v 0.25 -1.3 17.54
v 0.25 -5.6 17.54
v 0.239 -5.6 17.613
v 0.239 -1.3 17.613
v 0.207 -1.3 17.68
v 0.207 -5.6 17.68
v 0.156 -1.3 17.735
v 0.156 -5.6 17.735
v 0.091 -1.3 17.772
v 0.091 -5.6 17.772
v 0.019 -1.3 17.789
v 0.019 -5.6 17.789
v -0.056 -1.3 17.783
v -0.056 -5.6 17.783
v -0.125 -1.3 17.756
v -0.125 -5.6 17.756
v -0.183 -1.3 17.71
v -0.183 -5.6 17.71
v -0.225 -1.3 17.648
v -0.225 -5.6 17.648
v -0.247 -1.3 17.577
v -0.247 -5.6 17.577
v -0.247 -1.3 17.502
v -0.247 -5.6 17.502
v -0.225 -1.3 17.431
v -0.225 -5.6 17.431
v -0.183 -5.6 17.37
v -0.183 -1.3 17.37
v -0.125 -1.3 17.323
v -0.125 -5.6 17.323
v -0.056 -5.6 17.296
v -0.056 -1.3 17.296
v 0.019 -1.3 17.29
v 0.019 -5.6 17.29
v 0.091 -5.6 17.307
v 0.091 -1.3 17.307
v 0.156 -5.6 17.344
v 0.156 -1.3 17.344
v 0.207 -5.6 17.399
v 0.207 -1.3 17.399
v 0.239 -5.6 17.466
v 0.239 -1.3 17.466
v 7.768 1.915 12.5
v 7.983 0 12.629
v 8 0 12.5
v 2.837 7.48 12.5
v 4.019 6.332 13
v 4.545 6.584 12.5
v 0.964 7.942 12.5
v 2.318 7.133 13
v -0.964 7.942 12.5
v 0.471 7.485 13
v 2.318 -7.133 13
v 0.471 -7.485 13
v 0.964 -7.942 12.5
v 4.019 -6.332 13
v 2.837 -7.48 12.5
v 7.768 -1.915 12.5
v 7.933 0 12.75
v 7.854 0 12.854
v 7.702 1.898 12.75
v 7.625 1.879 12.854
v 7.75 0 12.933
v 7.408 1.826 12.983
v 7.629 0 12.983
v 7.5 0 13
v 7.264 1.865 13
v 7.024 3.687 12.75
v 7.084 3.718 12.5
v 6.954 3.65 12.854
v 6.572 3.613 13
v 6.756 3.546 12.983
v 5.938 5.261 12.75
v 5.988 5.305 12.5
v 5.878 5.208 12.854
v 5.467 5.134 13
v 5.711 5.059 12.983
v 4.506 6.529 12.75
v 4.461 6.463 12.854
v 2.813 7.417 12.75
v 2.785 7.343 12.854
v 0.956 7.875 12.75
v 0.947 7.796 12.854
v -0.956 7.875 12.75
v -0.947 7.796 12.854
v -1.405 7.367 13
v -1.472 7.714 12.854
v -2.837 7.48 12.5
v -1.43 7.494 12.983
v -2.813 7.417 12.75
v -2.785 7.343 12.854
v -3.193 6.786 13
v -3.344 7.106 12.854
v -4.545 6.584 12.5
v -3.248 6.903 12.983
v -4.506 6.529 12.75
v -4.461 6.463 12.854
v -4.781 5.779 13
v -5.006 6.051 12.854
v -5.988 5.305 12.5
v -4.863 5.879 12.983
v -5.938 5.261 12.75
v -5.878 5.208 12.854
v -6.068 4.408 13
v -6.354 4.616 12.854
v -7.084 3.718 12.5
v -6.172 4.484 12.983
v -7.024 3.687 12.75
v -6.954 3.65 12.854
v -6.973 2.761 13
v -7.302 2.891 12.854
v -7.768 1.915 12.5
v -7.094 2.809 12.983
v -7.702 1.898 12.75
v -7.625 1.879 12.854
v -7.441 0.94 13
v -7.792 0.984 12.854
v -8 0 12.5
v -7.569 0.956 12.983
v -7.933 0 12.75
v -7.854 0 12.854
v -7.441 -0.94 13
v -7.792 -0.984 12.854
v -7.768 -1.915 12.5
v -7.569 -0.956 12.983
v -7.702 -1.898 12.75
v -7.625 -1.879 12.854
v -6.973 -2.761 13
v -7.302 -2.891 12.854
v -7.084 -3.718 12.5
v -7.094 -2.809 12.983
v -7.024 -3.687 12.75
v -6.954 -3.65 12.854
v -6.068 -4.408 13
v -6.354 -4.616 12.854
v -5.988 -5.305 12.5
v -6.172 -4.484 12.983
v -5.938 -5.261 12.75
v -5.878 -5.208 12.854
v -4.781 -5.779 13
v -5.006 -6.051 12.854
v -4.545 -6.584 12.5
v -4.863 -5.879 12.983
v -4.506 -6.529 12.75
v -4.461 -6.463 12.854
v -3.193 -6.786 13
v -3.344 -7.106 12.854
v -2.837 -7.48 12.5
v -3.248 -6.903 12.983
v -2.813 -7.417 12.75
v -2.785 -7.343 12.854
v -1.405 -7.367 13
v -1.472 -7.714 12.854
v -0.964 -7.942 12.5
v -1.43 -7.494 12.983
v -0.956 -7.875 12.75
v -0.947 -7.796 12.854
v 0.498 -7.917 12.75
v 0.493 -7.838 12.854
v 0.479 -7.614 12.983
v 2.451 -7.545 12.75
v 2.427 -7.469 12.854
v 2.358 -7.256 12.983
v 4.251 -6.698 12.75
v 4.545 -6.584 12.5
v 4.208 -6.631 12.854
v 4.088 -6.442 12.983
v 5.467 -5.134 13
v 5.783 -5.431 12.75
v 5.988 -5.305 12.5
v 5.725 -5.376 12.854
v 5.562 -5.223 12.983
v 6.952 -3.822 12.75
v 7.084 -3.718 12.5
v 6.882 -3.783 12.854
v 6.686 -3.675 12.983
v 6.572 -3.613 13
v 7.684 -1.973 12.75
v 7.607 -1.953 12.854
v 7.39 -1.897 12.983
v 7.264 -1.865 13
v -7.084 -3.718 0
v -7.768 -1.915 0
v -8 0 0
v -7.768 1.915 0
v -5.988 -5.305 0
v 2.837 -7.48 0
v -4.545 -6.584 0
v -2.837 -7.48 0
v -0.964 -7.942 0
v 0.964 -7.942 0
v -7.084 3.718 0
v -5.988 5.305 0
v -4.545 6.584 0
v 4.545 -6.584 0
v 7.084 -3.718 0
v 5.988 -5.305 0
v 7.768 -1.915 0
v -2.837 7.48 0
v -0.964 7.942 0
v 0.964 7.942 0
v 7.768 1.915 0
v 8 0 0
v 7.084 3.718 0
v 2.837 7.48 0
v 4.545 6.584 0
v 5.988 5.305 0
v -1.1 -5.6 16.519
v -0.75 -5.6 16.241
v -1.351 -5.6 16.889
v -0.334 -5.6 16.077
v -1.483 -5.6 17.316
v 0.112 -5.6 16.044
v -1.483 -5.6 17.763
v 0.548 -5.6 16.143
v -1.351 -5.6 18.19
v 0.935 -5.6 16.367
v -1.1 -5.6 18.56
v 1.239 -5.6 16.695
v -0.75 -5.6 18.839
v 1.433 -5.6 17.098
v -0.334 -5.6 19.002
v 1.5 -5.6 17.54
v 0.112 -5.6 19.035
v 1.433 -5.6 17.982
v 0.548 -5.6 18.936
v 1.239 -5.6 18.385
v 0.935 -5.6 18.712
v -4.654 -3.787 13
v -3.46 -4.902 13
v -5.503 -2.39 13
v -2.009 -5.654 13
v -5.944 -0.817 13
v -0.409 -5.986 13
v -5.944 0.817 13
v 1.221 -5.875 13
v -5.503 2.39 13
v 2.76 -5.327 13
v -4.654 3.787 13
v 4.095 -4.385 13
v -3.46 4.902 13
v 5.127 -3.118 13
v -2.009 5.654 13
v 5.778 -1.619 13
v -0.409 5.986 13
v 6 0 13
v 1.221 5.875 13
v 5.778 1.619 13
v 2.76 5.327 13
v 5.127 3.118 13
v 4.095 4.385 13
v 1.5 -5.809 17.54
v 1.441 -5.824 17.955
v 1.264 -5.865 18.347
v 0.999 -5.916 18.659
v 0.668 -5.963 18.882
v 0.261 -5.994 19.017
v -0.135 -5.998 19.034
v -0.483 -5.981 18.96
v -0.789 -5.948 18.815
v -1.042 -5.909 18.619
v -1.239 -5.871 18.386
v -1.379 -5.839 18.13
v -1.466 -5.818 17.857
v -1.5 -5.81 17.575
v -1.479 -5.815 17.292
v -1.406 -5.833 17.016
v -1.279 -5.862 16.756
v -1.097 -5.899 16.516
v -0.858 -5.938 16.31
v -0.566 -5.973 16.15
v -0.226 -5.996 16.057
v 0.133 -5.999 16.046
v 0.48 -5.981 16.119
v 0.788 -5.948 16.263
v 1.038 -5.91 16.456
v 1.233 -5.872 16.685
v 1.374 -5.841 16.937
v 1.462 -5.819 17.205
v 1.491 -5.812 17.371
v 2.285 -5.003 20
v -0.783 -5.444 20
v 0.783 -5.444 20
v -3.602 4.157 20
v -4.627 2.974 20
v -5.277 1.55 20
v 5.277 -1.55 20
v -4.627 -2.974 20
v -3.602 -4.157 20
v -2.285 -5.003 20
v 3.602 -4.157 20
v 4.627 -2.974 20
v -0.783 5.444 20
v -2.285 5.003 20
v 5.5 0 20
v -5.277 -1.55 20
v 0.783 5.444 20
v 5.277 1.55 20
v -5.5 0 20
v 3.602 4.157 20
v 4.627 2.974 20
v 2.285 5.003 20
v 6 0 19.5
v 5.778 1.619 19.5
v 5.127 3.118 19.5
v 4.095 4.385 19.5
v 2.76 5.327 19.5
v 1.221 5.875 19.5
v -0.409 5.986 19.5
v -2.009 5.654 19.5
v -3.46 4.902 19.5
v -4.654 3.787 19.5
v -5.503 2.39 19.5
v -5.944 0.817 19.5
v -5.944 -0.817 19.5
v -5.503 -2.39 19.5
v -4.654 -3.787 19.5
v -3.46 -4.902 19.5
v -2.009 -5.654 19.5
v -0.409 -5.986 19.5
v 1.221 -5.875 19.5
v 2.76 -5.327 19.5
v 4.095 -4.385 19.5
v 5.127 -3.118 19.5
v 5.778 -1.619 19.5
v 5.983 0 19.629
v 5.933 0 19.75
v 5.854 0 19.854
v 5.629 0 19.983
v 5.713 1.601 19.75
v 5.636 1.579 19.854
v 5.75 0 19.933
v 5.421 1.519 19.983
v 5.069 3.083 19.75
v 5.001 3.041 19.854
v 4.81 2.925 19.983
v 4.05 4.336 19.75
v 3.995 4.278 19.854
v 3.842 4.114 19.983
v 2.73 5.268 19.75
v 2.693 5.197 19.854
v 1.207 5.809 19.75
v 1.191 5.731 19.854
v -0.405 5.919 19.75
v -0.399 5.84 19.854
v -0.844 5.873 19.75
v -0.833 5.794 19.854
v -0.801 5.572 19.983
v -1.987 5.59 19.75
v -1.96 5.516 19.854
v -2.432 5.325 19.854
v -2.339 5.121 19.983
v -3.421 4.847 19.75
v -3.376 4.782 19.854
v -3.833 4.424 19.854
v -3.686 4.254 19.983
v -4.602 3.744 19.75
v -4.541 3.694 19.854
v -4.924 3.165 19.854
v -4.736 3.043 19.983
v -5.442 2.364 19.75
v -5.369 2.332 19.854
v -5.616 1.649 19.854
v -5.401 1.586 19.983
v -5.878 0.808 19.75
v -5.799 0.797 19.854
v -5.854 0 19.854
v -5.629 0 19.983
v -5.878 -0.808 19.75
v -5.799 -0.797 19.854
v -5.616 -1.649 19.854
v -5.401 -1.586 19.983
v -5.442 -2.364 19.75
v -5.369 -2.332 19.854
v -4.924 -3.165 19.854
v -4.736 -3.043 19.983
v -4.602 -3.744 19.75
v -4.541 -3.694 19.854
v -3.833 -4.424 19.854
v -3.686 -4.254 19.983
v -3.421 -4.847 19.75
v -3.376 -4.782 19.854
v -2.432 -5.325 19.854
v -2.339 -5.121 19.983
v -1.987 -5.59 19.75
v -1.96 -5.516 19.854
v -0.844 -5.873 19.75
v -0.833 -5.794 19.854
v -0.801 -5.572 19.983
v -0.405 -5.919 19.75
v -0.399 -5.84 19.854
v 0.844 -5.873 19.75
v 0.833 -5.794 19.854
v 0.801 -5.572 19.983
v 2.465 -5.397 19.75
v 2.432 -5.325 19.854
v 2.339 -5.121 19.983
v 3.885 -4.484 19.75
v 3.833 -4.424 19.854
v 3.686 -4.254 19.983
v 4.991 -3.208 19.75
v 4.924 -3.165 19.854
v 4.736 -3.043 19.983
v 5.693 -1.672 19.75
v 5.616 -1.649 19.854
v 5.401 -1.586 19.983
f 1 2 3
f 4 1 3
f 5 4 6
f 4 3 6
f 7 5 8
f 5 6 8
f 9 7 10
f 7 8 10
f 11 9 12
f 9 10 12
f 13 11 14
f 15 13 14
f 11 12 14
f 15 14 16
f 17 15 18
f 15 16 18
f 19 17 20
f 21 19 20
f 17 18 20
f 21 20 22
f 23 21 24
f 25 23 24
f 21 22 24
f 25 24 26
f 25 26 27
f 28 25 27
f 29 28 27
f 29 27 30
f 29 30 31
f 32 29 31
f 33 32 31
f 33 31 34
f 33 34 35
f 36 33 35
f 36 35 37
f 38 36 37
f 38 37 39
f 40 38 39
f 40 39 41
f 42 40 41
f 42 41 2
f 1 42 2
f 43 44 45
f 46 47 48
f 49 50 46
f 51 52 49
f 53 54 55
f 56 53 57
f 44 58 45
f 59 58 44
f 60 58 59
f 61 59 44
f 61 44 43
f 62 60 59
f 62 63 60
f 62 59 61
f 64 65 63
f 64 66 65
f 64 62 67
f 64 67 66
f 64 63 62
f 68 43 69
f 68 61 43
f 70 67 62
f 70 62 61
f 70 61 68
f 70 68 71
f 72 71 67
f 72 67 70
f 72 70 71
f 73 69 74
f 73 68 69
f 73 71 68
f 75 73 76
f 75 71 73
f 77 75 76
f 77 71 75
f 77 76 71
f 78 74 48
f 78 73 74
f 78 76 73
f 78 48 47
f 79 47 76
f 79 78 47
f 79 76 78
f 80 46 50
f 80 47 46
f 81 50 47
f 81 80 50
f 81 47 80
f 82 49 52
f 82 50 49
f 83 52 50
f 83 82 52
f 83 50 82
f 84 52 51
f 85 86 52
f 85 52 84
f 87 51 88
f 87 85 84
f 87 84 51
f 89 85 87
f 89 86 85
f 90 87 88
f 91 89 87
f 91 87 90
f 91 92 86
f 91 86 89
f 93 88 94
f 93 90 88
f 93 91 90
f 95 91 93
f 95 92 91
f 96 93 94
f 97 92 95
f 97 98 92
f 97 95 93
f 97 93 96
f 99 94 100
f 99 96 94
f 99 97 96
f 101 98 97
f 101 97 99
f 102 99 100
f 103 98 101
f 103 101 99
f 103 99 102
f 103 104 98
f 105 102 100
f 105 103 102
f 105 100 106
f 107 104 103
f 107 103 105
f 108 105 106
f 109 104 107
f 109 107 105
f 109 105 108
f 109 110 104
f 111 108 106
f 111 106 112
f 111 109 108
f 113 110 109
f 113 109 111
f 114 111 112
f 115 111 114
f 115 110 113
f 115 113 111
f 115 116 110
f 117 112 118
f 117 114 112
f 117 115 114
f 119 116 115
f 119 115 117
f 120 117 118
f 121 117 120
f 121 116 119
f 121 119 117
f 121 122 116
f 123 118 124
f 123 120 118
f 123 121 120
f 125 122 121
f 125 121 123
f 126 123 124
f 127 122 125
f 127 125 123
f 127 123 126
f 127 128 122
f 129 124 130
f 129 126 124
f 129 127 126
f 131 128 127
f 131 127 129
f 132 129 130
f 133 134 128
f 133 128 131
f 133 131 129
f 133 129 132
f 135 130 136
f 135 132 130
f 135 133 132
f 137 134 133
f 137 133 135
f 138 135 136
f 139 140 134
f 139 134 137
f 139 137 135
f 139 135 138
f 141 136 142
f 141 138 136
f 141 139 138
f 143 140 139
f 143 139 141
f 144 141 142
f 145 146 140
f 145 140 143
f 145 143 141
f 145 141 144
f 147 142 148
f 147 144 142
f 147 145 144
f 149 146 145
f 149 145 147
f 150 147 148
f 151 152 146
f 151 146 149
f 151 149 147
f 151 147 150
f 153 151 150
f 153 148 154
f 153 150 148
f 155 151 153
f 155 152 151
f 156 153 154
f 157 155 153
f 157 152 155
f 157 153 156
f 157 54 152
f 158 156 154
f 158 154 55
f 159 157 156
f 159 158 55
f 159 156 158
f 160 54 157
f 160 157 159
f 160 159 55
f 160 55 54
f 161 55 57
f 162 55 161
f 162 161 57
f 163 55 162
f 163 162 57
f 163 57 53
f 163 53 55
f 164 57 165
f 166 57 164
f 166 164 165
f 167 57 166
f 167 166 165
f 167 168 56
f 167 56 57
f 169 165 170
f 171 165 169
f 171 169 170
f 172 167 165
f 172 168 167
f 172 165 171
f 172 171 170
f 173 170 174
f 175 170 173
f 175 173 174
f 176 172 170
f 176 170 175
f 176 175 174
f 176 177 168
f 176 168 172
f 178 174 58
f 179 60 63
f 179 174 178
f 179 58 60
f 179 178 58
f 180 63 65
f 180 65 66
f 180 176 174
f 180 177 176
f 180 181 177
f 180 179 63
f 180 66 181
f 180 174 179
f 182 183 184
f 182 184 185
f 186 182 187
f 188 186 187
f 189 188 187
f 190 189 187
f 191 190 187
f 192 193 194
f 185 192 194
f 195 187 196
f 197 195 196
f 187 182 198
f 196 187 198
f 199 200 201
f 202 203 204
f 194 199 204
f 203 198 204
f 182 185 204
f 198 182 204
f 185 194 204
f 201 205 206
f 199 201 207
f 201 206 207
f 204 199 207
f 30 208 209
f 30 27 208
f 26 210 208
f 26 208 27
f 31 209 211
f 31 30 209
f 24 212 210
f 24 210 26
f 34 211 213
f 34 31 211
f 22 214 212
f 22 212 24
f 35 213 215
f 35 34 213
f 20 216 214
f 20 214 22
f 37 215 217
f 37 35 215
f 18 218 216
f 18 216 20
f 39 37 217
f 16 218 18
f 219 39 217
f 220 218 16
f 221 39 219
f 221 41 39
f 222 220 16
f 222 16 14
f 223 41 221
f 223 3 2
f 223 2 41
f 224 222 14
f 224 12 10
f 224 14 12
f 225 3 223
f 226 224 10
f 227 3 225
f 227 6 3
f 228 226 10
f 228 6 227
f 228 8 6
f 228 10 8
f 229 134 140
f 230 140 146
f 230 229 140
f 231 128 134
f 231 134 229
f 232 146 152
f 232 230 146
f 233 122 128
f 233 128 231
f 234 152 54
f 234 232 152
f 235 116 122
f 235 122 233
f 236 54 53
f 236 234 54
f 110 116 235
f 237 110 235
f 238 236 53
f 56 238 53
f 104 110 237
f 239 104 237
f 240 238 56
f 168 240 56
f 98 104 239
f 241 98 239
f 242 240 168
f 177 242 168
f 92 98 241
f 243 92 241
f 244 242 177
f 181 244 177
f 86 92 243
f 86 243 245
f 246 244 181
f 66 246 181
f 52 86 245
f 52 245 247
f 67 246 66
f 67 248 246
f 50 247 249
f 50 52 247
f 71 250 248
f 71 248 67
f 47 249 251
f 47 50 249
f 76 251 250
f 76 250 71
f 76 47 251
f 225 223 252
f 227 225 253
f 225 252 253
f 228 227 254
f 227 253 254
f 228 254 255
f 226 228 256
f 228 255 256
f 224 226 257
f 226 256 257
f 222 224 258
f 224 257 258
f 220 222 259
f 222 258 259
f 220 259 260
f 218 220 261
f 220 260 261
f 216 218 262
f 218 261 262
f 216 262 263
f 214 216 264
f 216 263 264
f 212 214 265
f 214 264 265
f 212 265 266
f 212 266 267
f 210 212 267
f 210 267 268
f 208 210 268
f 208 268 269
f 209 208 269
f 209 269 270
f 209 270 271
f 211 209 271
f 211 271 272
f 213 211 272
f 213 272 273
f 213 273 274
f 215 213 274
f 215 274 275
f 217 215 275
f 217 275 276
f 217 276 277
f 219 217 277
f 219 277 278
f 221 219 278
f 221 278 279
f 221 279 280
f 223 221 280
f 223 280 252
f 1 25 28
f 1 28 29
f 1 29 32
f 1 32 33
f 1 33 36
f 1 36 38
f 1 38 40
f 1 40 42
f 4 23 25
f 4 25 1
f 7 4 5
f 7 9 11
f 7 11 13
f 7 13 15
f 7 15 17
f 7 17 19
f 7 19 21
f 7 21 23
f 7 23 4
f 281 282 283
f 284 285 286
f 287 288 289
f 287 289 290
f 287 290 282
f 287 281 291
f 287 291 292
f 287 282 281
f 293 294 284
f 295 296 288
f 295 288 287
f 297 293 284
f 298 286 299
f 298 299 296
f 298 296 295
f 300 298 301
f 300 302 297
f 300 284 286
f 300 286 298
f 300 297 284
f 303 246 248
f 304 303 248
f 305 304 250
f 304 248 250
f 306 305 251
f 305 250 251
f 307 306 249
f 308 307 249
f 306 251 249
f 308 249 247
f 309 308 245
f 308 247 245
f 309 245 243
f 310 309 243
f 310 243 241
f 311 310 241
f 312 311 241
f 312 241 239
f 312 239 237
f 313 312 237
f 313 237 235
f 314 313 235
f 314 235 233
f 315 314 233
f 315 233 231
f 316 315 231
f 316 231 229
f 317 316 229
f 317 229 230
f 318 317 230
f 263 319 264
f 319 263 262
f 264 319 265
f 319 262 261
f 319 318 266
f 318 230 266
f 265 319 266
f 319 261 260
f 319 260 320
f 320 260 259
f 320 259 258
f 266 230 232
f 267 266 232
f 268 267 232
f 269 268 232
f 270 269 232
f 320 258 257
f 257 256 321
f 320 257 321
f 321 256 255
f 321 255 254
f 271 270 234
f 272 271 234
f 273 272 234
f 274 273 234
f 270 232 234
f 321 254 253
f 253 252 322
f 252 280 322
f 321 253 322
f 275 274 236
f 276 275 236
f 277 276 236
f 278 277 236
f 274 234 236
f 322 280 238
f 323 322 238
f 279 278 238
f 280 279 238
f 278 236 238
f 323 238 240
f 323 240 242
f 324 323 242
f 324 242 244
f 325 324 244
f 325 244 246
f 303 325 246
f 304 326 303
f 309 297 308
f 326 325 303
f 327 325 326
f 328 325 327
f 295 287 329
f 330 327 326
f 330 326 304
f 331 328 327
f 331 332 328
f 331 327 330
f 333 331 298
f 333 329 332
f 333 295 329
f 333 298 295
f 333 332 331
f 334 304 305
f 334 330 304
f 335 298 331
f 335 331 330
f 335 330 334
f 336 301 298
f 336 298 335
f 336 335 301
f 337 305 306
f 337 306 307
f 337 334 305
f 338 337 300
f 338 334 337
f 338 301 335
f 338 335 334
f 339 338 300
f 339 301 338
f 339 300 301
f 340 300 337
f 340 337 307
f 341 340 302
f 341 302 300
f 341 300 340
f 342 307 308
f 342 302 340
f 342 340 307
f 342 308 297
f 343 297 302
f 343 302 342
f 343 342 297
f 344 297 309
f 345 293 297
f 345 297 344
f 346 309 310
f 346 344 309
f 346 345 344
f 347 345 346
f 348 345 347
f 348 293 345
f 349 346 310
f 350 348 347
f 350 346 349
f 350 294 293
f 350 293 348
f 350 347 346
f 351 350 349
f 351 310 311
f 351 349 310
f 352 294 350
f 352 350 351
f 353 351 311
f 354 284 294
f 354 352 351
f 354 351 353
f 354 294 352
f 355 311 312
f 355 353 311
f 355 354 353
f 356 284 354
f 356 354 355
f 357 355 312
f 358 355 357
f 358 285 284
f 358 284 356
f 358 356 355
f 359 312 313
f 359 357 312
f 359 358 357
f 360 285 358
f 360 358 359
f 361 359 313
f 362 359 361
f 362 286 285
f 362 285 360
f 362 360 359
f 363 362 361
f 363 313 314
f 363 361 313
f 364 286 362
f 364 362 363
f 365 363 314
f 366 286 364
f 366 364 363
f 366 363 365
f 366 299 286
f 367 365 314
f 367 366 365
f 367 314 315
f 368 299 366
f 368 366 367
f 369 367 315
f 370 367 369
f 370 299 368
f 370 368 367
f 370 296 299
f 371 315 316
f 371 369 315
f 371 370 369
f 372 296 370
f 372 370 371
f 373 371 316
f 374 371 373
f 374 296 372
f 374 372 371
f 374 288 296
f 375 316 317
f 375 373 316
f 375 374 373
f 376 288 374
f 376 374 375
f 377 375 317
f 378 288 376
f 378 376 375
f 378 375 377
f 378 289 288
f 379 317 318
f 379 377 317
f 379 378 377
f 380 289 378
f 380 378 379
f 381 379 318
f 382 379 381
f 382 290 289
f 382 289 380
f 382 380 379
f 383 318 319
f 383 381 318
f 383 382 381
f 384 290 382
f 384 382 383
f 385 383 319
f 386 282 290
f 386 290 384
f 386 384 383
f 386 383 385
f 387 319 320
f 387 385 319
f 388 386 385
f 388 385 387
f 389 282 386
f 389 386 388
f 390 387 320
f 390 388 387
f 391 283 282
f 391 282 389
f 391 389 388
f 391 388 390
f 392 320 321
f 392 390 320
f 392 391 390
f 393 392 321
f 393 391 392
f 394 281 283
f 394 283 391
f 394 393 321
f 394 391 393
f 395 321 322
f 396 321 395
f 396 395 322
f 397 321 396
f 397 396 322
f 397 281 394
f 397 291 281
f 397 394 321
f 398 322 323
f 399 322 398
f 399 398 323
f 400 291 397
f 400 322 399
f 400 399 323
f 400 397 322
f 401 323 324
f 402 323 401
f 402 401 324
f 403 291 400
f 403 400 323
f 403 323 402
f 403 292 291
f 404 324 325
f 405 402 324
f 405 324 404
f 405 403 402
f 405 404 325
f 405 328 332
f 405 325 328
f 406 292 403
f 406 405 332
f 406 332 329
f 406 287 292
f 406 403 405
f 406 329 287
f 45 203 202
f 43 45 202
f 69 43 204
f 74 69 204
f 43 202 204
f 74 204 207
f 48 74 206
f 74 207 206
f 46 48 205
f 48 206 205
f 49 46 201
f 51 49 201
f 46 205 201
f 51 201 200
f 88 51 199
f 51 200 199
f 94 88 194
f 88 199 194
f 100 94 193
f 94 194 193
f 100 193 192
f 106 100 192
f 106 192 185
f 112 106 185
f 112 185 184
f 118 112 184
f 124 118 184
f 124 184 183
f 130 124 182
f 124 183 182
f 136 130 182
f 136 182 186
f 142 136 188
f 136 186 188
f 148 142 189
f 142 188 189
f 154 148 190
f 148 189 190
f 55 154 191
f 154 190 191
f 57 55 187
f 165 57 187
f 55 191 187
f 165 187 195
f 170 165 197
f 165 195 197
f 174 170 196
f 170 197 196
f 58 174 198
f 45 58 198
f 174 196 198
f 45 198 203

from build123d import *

# Parameters (mm, degrees)
F0_R     = 6
F1_DEPTH = 20
F0_R_2   = 8
F2_DEPTH = 13
F4_R     = 0.25
F5_DEPTH = 23.7
F4_R_2   = 1.5
F6_DEPTH = 19.4
F7_R     = 0.5


with BuildPart() as f1:
    # F0 (on Top) → F1 (new body)
    with BuildSketch(Plane.XY):
        Circle(F0_R)
    extrude(amount=F1_DEPTH)

    # F0 (on Top) → F2 (join)
    with BuildSketch(Plane.XY):
        Circle(F0_R_2)
        Circle(F0_R, mode=Mode.SUBTRACT)
    extrude(amount=F2_DEPTH)

    # F4 (on offset) → F5 (cut)
    with BuildSketch(Plane.XZ.offset(25)):
        with Locations((0, 17.539654)):
            Circle(F4_R)
    extrude(amount=-F5_DEPTH, mode=Mode.SUBTRACT)

    # F4 (on offset) → F6 (cut)
    with BuildSketch(Plane.XZ.offset(25)):
        with Locations((0, 17.539654)):
            Circle(F4_R_2)
        with Locations((0, 17.539654)):
            Circle(F4_R, mode=Mode.SUBTRACT)
    extrude(amount=-F6_DEPTH, mode=Mode.SUBTRACT)

    # F7
    f7_edges = [f1.edges().sort_by_distance(p)[0] for p in [
        (-8, 0, 13),
        (-6, 0, 20),
    ]]
    fillet(f7_edges, radius=F7_R)


solid = f1.part
